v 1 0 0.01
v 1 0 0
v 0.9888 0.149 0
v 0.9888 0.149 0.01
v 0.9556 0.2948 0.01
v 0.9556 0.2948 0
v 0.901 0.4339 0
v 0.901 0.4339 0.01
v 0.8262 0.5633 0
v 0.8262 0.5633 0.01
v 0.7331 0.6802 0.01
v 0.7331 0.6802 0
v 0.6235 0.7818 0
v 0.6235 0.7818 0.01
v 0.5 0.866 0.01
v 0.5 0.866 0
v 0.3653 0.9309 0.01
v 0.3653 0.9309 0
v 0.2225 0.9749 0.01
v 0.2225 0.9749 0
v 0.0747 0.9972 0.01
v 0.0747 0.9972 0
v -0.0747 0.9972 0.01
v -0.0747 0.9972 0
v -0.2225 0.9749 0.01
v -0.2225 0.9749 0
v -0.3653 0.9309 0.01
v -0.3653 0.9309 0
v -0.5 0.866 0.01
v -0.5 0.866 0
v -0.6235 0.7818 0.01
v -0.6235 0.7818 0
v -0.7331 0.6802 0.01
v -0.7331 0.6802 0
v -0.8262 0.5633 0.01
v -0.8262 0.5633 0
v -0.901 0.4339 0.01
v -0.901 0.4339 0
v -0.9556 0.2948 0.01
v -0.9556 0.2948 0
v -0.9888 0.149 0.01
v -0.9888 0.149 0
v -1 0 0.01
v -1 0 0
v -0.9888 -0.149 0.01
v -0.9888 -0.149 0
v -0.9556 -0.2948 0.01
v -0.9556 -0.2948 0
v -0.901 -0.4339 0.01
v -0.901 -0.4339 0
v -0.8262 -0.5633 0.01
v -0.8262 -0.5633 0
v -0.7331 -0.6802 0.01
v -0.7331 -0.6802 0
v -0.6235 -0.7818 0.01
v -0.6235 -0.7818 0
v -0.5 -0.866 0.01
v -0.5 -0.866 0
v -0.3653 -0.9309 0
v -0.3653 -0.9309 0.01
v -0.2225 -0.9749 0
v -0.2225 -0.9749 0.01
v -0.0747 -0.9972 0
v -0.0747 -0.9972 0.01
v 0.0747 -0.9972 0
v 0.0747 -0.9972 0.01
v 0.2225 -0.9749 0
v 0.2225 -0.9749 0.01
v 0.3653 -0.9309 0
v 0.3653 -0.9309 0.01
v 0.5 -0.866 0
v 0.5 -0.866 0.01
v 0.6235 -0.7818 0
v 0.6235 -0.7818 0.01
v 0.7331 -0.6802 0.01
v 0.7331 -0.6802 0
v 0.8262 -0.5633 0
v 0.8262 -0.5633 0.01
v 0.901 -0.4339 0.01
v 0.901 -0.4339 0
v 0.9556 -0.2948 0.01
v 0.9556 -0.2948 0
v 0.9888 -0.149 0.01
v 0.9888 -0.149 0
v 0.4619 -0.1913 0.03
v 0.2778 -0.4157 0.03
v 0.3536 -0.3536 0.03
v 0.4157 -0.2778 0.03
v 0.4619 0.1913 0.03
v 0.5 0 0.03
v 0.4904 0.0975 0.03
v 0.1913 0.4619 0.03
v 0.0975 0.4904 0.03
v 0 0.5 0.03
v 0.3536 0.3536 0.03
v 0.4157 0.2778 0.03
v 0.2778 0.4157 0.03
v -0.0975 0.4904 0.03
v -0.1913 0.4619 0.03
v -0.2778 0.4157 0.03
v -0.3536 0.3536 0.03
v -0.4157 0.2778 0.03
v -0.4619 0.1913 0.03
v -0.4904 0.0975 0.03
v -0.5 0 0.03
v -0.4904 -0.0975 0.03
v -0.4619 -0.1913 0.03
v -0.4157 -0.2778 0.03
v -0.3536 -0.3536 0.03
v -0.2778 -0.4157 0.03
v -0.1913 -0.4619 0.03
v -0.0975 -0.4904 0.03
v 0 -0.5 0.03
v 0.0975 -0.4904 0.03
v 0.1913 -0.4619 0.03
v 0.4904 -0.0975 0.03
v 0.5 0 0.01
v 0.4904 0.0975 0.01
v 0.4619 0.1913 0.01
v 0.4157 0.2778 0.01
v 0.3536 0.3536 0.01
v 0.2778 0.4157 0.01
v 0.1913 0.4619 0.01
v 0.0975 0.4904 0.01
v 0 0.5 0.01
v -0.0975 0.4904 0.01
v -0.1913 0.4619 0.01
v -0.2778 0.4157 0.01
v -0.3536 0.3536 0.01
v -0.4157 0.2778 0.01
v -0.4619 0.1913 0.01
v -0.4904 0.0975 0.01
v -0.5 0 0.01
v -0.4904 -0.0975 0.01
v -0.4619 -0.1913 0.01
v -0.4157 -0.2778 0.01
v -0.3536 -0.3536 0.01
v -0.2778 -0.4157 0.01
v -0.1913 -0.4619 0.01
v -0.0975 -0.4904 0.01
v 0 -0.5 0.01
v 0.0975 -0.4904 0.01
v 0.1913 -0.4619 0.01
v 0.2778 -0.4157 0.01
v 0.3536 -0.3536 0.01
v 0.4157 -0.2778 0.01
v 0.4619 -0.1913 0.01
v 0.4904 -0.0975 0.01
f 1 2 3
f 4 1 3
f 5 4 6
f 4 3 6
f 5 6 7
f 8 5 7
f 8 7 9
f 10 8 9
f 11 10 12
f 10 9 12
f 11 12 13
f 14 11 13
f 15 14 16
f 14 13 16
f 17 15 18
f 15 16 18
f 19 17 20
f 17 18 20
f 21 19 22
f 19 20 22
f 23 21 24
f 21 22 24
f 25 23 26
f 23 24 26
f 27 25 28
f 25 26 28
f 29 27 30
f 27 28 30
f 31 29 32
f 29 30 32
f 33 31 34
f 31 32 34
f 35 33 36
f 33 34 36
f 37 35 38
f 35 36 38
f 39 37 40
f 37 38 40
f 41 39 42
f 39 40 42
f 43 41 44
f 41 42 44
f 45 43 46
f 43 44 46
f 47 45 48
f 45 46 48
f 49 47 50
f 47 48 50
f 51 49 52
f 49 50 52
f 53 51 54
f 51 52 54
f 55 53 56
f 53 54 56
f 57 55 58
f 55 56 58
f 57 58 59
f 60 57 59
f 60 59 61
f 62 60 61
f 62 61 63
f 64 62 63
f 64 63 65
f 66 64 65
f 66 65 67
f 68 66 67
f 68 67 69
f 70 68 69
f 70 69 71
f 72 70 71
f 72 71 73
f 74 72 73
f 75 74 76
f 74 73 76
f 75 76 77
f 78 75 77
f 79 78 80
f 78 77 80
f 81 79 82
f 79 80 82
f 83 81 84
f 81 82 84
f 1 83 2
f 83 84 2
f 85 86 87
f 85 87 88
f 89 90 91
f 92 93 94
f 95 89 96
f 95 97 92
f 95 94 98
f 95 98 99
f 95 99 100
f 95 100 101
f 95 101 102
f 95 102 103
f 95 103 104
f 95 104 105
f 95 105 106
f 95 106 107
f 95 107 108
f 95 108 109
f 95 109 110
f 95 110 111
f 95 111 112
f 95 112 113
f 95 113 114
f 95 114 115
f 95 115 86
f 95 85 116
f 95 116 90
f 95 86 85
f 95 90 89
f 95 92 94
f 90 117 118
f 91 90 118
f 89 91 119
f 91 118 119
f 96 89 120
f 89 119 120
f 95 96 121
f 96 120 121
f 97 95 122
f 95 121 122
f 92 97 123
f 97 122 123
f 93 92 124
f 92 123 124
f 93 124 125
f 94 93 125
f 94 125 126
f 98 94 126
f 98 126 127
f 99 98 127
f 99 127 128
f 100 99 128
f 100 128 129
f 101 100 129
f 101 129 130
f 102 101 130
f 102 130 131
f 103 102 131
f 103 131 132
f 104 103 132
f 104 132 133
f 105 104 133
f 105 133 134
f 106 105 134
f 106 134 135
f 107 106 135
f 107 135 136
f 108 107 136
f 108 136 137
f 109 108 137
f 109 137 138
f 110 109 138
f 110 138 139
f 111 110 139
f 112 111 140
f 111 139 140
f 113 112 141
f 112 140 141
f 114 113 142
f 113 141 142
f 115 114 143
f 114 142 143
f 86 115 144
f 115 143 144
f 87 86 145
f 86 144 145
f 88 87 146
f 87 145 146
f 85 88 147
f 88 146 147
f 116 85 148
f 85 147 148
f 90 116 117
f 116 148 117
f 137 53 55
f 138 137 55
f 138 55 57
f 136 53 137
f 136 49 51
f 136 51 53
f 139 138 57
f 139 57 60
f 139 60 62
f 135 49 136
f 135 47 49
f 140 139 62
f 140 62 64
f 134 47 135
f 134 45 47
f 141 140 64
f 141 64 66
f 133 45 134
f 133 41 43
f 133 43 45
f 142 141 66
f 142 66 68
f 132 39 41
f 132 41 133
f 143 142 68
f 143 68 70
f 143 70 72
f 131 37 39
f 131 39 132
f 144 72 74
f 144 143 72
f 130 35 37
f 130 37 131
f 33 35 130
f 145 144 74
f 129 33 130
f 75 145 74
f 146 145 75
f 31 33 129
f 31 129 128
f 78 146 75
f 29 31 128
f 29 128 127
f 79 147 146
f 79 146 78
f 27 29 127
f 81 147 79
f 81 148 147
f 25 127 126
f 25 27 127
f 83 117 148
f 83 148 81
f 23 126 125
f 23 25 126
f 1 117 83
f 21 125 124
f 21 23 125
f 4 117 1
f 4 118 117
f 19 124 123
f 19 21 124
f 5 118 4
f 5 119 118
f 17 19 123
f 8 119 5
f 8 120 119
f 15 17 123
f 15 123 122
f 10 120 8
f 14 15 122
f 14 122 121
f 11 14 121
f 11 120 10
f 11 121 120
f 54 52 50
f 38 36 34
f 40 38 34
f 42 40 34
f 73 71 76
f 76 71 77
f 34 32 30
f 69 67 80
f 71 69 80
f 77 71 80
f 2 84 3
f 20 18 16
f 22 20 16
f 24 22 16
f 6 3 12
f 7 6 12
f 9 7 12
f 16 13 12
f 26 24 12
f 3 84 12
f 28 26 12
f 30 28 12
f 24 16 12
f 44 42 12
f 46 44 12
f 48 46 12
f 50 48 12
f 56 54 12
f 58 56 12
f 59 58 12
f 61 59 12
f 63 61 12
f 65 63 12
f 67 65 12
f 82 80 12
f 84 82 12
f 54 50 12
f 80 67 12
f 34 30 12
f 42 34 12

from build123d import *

# Parameters (mm, degrees)
CYLINDER001_R     = 1
CYLINDER001_DEPTH = 0.01
CYLINDER_R        = 0.5
CYLINDER_DEPTH    = 0.03


with BuildPart() as cylinder001:
    # Cylinder001 → Cylinder001 (new body)
    with BuildSketch(Plane.XY):
        Circle(CYLINDER001_R)
    extrude(amount=CYLINDER001_DEPTH)


with BuildPart() as fid100x200round:
    # Cylinder → Cylinder (new body)
    with BuildSketch(Plane.XY):
        Circle(CYLINDER_R)
    extrude(amount=CYLINDER_DEPTH)

    # Fusion: union Cylinder001
    add(cylinder001.part)


solid = fid100x200round.part
